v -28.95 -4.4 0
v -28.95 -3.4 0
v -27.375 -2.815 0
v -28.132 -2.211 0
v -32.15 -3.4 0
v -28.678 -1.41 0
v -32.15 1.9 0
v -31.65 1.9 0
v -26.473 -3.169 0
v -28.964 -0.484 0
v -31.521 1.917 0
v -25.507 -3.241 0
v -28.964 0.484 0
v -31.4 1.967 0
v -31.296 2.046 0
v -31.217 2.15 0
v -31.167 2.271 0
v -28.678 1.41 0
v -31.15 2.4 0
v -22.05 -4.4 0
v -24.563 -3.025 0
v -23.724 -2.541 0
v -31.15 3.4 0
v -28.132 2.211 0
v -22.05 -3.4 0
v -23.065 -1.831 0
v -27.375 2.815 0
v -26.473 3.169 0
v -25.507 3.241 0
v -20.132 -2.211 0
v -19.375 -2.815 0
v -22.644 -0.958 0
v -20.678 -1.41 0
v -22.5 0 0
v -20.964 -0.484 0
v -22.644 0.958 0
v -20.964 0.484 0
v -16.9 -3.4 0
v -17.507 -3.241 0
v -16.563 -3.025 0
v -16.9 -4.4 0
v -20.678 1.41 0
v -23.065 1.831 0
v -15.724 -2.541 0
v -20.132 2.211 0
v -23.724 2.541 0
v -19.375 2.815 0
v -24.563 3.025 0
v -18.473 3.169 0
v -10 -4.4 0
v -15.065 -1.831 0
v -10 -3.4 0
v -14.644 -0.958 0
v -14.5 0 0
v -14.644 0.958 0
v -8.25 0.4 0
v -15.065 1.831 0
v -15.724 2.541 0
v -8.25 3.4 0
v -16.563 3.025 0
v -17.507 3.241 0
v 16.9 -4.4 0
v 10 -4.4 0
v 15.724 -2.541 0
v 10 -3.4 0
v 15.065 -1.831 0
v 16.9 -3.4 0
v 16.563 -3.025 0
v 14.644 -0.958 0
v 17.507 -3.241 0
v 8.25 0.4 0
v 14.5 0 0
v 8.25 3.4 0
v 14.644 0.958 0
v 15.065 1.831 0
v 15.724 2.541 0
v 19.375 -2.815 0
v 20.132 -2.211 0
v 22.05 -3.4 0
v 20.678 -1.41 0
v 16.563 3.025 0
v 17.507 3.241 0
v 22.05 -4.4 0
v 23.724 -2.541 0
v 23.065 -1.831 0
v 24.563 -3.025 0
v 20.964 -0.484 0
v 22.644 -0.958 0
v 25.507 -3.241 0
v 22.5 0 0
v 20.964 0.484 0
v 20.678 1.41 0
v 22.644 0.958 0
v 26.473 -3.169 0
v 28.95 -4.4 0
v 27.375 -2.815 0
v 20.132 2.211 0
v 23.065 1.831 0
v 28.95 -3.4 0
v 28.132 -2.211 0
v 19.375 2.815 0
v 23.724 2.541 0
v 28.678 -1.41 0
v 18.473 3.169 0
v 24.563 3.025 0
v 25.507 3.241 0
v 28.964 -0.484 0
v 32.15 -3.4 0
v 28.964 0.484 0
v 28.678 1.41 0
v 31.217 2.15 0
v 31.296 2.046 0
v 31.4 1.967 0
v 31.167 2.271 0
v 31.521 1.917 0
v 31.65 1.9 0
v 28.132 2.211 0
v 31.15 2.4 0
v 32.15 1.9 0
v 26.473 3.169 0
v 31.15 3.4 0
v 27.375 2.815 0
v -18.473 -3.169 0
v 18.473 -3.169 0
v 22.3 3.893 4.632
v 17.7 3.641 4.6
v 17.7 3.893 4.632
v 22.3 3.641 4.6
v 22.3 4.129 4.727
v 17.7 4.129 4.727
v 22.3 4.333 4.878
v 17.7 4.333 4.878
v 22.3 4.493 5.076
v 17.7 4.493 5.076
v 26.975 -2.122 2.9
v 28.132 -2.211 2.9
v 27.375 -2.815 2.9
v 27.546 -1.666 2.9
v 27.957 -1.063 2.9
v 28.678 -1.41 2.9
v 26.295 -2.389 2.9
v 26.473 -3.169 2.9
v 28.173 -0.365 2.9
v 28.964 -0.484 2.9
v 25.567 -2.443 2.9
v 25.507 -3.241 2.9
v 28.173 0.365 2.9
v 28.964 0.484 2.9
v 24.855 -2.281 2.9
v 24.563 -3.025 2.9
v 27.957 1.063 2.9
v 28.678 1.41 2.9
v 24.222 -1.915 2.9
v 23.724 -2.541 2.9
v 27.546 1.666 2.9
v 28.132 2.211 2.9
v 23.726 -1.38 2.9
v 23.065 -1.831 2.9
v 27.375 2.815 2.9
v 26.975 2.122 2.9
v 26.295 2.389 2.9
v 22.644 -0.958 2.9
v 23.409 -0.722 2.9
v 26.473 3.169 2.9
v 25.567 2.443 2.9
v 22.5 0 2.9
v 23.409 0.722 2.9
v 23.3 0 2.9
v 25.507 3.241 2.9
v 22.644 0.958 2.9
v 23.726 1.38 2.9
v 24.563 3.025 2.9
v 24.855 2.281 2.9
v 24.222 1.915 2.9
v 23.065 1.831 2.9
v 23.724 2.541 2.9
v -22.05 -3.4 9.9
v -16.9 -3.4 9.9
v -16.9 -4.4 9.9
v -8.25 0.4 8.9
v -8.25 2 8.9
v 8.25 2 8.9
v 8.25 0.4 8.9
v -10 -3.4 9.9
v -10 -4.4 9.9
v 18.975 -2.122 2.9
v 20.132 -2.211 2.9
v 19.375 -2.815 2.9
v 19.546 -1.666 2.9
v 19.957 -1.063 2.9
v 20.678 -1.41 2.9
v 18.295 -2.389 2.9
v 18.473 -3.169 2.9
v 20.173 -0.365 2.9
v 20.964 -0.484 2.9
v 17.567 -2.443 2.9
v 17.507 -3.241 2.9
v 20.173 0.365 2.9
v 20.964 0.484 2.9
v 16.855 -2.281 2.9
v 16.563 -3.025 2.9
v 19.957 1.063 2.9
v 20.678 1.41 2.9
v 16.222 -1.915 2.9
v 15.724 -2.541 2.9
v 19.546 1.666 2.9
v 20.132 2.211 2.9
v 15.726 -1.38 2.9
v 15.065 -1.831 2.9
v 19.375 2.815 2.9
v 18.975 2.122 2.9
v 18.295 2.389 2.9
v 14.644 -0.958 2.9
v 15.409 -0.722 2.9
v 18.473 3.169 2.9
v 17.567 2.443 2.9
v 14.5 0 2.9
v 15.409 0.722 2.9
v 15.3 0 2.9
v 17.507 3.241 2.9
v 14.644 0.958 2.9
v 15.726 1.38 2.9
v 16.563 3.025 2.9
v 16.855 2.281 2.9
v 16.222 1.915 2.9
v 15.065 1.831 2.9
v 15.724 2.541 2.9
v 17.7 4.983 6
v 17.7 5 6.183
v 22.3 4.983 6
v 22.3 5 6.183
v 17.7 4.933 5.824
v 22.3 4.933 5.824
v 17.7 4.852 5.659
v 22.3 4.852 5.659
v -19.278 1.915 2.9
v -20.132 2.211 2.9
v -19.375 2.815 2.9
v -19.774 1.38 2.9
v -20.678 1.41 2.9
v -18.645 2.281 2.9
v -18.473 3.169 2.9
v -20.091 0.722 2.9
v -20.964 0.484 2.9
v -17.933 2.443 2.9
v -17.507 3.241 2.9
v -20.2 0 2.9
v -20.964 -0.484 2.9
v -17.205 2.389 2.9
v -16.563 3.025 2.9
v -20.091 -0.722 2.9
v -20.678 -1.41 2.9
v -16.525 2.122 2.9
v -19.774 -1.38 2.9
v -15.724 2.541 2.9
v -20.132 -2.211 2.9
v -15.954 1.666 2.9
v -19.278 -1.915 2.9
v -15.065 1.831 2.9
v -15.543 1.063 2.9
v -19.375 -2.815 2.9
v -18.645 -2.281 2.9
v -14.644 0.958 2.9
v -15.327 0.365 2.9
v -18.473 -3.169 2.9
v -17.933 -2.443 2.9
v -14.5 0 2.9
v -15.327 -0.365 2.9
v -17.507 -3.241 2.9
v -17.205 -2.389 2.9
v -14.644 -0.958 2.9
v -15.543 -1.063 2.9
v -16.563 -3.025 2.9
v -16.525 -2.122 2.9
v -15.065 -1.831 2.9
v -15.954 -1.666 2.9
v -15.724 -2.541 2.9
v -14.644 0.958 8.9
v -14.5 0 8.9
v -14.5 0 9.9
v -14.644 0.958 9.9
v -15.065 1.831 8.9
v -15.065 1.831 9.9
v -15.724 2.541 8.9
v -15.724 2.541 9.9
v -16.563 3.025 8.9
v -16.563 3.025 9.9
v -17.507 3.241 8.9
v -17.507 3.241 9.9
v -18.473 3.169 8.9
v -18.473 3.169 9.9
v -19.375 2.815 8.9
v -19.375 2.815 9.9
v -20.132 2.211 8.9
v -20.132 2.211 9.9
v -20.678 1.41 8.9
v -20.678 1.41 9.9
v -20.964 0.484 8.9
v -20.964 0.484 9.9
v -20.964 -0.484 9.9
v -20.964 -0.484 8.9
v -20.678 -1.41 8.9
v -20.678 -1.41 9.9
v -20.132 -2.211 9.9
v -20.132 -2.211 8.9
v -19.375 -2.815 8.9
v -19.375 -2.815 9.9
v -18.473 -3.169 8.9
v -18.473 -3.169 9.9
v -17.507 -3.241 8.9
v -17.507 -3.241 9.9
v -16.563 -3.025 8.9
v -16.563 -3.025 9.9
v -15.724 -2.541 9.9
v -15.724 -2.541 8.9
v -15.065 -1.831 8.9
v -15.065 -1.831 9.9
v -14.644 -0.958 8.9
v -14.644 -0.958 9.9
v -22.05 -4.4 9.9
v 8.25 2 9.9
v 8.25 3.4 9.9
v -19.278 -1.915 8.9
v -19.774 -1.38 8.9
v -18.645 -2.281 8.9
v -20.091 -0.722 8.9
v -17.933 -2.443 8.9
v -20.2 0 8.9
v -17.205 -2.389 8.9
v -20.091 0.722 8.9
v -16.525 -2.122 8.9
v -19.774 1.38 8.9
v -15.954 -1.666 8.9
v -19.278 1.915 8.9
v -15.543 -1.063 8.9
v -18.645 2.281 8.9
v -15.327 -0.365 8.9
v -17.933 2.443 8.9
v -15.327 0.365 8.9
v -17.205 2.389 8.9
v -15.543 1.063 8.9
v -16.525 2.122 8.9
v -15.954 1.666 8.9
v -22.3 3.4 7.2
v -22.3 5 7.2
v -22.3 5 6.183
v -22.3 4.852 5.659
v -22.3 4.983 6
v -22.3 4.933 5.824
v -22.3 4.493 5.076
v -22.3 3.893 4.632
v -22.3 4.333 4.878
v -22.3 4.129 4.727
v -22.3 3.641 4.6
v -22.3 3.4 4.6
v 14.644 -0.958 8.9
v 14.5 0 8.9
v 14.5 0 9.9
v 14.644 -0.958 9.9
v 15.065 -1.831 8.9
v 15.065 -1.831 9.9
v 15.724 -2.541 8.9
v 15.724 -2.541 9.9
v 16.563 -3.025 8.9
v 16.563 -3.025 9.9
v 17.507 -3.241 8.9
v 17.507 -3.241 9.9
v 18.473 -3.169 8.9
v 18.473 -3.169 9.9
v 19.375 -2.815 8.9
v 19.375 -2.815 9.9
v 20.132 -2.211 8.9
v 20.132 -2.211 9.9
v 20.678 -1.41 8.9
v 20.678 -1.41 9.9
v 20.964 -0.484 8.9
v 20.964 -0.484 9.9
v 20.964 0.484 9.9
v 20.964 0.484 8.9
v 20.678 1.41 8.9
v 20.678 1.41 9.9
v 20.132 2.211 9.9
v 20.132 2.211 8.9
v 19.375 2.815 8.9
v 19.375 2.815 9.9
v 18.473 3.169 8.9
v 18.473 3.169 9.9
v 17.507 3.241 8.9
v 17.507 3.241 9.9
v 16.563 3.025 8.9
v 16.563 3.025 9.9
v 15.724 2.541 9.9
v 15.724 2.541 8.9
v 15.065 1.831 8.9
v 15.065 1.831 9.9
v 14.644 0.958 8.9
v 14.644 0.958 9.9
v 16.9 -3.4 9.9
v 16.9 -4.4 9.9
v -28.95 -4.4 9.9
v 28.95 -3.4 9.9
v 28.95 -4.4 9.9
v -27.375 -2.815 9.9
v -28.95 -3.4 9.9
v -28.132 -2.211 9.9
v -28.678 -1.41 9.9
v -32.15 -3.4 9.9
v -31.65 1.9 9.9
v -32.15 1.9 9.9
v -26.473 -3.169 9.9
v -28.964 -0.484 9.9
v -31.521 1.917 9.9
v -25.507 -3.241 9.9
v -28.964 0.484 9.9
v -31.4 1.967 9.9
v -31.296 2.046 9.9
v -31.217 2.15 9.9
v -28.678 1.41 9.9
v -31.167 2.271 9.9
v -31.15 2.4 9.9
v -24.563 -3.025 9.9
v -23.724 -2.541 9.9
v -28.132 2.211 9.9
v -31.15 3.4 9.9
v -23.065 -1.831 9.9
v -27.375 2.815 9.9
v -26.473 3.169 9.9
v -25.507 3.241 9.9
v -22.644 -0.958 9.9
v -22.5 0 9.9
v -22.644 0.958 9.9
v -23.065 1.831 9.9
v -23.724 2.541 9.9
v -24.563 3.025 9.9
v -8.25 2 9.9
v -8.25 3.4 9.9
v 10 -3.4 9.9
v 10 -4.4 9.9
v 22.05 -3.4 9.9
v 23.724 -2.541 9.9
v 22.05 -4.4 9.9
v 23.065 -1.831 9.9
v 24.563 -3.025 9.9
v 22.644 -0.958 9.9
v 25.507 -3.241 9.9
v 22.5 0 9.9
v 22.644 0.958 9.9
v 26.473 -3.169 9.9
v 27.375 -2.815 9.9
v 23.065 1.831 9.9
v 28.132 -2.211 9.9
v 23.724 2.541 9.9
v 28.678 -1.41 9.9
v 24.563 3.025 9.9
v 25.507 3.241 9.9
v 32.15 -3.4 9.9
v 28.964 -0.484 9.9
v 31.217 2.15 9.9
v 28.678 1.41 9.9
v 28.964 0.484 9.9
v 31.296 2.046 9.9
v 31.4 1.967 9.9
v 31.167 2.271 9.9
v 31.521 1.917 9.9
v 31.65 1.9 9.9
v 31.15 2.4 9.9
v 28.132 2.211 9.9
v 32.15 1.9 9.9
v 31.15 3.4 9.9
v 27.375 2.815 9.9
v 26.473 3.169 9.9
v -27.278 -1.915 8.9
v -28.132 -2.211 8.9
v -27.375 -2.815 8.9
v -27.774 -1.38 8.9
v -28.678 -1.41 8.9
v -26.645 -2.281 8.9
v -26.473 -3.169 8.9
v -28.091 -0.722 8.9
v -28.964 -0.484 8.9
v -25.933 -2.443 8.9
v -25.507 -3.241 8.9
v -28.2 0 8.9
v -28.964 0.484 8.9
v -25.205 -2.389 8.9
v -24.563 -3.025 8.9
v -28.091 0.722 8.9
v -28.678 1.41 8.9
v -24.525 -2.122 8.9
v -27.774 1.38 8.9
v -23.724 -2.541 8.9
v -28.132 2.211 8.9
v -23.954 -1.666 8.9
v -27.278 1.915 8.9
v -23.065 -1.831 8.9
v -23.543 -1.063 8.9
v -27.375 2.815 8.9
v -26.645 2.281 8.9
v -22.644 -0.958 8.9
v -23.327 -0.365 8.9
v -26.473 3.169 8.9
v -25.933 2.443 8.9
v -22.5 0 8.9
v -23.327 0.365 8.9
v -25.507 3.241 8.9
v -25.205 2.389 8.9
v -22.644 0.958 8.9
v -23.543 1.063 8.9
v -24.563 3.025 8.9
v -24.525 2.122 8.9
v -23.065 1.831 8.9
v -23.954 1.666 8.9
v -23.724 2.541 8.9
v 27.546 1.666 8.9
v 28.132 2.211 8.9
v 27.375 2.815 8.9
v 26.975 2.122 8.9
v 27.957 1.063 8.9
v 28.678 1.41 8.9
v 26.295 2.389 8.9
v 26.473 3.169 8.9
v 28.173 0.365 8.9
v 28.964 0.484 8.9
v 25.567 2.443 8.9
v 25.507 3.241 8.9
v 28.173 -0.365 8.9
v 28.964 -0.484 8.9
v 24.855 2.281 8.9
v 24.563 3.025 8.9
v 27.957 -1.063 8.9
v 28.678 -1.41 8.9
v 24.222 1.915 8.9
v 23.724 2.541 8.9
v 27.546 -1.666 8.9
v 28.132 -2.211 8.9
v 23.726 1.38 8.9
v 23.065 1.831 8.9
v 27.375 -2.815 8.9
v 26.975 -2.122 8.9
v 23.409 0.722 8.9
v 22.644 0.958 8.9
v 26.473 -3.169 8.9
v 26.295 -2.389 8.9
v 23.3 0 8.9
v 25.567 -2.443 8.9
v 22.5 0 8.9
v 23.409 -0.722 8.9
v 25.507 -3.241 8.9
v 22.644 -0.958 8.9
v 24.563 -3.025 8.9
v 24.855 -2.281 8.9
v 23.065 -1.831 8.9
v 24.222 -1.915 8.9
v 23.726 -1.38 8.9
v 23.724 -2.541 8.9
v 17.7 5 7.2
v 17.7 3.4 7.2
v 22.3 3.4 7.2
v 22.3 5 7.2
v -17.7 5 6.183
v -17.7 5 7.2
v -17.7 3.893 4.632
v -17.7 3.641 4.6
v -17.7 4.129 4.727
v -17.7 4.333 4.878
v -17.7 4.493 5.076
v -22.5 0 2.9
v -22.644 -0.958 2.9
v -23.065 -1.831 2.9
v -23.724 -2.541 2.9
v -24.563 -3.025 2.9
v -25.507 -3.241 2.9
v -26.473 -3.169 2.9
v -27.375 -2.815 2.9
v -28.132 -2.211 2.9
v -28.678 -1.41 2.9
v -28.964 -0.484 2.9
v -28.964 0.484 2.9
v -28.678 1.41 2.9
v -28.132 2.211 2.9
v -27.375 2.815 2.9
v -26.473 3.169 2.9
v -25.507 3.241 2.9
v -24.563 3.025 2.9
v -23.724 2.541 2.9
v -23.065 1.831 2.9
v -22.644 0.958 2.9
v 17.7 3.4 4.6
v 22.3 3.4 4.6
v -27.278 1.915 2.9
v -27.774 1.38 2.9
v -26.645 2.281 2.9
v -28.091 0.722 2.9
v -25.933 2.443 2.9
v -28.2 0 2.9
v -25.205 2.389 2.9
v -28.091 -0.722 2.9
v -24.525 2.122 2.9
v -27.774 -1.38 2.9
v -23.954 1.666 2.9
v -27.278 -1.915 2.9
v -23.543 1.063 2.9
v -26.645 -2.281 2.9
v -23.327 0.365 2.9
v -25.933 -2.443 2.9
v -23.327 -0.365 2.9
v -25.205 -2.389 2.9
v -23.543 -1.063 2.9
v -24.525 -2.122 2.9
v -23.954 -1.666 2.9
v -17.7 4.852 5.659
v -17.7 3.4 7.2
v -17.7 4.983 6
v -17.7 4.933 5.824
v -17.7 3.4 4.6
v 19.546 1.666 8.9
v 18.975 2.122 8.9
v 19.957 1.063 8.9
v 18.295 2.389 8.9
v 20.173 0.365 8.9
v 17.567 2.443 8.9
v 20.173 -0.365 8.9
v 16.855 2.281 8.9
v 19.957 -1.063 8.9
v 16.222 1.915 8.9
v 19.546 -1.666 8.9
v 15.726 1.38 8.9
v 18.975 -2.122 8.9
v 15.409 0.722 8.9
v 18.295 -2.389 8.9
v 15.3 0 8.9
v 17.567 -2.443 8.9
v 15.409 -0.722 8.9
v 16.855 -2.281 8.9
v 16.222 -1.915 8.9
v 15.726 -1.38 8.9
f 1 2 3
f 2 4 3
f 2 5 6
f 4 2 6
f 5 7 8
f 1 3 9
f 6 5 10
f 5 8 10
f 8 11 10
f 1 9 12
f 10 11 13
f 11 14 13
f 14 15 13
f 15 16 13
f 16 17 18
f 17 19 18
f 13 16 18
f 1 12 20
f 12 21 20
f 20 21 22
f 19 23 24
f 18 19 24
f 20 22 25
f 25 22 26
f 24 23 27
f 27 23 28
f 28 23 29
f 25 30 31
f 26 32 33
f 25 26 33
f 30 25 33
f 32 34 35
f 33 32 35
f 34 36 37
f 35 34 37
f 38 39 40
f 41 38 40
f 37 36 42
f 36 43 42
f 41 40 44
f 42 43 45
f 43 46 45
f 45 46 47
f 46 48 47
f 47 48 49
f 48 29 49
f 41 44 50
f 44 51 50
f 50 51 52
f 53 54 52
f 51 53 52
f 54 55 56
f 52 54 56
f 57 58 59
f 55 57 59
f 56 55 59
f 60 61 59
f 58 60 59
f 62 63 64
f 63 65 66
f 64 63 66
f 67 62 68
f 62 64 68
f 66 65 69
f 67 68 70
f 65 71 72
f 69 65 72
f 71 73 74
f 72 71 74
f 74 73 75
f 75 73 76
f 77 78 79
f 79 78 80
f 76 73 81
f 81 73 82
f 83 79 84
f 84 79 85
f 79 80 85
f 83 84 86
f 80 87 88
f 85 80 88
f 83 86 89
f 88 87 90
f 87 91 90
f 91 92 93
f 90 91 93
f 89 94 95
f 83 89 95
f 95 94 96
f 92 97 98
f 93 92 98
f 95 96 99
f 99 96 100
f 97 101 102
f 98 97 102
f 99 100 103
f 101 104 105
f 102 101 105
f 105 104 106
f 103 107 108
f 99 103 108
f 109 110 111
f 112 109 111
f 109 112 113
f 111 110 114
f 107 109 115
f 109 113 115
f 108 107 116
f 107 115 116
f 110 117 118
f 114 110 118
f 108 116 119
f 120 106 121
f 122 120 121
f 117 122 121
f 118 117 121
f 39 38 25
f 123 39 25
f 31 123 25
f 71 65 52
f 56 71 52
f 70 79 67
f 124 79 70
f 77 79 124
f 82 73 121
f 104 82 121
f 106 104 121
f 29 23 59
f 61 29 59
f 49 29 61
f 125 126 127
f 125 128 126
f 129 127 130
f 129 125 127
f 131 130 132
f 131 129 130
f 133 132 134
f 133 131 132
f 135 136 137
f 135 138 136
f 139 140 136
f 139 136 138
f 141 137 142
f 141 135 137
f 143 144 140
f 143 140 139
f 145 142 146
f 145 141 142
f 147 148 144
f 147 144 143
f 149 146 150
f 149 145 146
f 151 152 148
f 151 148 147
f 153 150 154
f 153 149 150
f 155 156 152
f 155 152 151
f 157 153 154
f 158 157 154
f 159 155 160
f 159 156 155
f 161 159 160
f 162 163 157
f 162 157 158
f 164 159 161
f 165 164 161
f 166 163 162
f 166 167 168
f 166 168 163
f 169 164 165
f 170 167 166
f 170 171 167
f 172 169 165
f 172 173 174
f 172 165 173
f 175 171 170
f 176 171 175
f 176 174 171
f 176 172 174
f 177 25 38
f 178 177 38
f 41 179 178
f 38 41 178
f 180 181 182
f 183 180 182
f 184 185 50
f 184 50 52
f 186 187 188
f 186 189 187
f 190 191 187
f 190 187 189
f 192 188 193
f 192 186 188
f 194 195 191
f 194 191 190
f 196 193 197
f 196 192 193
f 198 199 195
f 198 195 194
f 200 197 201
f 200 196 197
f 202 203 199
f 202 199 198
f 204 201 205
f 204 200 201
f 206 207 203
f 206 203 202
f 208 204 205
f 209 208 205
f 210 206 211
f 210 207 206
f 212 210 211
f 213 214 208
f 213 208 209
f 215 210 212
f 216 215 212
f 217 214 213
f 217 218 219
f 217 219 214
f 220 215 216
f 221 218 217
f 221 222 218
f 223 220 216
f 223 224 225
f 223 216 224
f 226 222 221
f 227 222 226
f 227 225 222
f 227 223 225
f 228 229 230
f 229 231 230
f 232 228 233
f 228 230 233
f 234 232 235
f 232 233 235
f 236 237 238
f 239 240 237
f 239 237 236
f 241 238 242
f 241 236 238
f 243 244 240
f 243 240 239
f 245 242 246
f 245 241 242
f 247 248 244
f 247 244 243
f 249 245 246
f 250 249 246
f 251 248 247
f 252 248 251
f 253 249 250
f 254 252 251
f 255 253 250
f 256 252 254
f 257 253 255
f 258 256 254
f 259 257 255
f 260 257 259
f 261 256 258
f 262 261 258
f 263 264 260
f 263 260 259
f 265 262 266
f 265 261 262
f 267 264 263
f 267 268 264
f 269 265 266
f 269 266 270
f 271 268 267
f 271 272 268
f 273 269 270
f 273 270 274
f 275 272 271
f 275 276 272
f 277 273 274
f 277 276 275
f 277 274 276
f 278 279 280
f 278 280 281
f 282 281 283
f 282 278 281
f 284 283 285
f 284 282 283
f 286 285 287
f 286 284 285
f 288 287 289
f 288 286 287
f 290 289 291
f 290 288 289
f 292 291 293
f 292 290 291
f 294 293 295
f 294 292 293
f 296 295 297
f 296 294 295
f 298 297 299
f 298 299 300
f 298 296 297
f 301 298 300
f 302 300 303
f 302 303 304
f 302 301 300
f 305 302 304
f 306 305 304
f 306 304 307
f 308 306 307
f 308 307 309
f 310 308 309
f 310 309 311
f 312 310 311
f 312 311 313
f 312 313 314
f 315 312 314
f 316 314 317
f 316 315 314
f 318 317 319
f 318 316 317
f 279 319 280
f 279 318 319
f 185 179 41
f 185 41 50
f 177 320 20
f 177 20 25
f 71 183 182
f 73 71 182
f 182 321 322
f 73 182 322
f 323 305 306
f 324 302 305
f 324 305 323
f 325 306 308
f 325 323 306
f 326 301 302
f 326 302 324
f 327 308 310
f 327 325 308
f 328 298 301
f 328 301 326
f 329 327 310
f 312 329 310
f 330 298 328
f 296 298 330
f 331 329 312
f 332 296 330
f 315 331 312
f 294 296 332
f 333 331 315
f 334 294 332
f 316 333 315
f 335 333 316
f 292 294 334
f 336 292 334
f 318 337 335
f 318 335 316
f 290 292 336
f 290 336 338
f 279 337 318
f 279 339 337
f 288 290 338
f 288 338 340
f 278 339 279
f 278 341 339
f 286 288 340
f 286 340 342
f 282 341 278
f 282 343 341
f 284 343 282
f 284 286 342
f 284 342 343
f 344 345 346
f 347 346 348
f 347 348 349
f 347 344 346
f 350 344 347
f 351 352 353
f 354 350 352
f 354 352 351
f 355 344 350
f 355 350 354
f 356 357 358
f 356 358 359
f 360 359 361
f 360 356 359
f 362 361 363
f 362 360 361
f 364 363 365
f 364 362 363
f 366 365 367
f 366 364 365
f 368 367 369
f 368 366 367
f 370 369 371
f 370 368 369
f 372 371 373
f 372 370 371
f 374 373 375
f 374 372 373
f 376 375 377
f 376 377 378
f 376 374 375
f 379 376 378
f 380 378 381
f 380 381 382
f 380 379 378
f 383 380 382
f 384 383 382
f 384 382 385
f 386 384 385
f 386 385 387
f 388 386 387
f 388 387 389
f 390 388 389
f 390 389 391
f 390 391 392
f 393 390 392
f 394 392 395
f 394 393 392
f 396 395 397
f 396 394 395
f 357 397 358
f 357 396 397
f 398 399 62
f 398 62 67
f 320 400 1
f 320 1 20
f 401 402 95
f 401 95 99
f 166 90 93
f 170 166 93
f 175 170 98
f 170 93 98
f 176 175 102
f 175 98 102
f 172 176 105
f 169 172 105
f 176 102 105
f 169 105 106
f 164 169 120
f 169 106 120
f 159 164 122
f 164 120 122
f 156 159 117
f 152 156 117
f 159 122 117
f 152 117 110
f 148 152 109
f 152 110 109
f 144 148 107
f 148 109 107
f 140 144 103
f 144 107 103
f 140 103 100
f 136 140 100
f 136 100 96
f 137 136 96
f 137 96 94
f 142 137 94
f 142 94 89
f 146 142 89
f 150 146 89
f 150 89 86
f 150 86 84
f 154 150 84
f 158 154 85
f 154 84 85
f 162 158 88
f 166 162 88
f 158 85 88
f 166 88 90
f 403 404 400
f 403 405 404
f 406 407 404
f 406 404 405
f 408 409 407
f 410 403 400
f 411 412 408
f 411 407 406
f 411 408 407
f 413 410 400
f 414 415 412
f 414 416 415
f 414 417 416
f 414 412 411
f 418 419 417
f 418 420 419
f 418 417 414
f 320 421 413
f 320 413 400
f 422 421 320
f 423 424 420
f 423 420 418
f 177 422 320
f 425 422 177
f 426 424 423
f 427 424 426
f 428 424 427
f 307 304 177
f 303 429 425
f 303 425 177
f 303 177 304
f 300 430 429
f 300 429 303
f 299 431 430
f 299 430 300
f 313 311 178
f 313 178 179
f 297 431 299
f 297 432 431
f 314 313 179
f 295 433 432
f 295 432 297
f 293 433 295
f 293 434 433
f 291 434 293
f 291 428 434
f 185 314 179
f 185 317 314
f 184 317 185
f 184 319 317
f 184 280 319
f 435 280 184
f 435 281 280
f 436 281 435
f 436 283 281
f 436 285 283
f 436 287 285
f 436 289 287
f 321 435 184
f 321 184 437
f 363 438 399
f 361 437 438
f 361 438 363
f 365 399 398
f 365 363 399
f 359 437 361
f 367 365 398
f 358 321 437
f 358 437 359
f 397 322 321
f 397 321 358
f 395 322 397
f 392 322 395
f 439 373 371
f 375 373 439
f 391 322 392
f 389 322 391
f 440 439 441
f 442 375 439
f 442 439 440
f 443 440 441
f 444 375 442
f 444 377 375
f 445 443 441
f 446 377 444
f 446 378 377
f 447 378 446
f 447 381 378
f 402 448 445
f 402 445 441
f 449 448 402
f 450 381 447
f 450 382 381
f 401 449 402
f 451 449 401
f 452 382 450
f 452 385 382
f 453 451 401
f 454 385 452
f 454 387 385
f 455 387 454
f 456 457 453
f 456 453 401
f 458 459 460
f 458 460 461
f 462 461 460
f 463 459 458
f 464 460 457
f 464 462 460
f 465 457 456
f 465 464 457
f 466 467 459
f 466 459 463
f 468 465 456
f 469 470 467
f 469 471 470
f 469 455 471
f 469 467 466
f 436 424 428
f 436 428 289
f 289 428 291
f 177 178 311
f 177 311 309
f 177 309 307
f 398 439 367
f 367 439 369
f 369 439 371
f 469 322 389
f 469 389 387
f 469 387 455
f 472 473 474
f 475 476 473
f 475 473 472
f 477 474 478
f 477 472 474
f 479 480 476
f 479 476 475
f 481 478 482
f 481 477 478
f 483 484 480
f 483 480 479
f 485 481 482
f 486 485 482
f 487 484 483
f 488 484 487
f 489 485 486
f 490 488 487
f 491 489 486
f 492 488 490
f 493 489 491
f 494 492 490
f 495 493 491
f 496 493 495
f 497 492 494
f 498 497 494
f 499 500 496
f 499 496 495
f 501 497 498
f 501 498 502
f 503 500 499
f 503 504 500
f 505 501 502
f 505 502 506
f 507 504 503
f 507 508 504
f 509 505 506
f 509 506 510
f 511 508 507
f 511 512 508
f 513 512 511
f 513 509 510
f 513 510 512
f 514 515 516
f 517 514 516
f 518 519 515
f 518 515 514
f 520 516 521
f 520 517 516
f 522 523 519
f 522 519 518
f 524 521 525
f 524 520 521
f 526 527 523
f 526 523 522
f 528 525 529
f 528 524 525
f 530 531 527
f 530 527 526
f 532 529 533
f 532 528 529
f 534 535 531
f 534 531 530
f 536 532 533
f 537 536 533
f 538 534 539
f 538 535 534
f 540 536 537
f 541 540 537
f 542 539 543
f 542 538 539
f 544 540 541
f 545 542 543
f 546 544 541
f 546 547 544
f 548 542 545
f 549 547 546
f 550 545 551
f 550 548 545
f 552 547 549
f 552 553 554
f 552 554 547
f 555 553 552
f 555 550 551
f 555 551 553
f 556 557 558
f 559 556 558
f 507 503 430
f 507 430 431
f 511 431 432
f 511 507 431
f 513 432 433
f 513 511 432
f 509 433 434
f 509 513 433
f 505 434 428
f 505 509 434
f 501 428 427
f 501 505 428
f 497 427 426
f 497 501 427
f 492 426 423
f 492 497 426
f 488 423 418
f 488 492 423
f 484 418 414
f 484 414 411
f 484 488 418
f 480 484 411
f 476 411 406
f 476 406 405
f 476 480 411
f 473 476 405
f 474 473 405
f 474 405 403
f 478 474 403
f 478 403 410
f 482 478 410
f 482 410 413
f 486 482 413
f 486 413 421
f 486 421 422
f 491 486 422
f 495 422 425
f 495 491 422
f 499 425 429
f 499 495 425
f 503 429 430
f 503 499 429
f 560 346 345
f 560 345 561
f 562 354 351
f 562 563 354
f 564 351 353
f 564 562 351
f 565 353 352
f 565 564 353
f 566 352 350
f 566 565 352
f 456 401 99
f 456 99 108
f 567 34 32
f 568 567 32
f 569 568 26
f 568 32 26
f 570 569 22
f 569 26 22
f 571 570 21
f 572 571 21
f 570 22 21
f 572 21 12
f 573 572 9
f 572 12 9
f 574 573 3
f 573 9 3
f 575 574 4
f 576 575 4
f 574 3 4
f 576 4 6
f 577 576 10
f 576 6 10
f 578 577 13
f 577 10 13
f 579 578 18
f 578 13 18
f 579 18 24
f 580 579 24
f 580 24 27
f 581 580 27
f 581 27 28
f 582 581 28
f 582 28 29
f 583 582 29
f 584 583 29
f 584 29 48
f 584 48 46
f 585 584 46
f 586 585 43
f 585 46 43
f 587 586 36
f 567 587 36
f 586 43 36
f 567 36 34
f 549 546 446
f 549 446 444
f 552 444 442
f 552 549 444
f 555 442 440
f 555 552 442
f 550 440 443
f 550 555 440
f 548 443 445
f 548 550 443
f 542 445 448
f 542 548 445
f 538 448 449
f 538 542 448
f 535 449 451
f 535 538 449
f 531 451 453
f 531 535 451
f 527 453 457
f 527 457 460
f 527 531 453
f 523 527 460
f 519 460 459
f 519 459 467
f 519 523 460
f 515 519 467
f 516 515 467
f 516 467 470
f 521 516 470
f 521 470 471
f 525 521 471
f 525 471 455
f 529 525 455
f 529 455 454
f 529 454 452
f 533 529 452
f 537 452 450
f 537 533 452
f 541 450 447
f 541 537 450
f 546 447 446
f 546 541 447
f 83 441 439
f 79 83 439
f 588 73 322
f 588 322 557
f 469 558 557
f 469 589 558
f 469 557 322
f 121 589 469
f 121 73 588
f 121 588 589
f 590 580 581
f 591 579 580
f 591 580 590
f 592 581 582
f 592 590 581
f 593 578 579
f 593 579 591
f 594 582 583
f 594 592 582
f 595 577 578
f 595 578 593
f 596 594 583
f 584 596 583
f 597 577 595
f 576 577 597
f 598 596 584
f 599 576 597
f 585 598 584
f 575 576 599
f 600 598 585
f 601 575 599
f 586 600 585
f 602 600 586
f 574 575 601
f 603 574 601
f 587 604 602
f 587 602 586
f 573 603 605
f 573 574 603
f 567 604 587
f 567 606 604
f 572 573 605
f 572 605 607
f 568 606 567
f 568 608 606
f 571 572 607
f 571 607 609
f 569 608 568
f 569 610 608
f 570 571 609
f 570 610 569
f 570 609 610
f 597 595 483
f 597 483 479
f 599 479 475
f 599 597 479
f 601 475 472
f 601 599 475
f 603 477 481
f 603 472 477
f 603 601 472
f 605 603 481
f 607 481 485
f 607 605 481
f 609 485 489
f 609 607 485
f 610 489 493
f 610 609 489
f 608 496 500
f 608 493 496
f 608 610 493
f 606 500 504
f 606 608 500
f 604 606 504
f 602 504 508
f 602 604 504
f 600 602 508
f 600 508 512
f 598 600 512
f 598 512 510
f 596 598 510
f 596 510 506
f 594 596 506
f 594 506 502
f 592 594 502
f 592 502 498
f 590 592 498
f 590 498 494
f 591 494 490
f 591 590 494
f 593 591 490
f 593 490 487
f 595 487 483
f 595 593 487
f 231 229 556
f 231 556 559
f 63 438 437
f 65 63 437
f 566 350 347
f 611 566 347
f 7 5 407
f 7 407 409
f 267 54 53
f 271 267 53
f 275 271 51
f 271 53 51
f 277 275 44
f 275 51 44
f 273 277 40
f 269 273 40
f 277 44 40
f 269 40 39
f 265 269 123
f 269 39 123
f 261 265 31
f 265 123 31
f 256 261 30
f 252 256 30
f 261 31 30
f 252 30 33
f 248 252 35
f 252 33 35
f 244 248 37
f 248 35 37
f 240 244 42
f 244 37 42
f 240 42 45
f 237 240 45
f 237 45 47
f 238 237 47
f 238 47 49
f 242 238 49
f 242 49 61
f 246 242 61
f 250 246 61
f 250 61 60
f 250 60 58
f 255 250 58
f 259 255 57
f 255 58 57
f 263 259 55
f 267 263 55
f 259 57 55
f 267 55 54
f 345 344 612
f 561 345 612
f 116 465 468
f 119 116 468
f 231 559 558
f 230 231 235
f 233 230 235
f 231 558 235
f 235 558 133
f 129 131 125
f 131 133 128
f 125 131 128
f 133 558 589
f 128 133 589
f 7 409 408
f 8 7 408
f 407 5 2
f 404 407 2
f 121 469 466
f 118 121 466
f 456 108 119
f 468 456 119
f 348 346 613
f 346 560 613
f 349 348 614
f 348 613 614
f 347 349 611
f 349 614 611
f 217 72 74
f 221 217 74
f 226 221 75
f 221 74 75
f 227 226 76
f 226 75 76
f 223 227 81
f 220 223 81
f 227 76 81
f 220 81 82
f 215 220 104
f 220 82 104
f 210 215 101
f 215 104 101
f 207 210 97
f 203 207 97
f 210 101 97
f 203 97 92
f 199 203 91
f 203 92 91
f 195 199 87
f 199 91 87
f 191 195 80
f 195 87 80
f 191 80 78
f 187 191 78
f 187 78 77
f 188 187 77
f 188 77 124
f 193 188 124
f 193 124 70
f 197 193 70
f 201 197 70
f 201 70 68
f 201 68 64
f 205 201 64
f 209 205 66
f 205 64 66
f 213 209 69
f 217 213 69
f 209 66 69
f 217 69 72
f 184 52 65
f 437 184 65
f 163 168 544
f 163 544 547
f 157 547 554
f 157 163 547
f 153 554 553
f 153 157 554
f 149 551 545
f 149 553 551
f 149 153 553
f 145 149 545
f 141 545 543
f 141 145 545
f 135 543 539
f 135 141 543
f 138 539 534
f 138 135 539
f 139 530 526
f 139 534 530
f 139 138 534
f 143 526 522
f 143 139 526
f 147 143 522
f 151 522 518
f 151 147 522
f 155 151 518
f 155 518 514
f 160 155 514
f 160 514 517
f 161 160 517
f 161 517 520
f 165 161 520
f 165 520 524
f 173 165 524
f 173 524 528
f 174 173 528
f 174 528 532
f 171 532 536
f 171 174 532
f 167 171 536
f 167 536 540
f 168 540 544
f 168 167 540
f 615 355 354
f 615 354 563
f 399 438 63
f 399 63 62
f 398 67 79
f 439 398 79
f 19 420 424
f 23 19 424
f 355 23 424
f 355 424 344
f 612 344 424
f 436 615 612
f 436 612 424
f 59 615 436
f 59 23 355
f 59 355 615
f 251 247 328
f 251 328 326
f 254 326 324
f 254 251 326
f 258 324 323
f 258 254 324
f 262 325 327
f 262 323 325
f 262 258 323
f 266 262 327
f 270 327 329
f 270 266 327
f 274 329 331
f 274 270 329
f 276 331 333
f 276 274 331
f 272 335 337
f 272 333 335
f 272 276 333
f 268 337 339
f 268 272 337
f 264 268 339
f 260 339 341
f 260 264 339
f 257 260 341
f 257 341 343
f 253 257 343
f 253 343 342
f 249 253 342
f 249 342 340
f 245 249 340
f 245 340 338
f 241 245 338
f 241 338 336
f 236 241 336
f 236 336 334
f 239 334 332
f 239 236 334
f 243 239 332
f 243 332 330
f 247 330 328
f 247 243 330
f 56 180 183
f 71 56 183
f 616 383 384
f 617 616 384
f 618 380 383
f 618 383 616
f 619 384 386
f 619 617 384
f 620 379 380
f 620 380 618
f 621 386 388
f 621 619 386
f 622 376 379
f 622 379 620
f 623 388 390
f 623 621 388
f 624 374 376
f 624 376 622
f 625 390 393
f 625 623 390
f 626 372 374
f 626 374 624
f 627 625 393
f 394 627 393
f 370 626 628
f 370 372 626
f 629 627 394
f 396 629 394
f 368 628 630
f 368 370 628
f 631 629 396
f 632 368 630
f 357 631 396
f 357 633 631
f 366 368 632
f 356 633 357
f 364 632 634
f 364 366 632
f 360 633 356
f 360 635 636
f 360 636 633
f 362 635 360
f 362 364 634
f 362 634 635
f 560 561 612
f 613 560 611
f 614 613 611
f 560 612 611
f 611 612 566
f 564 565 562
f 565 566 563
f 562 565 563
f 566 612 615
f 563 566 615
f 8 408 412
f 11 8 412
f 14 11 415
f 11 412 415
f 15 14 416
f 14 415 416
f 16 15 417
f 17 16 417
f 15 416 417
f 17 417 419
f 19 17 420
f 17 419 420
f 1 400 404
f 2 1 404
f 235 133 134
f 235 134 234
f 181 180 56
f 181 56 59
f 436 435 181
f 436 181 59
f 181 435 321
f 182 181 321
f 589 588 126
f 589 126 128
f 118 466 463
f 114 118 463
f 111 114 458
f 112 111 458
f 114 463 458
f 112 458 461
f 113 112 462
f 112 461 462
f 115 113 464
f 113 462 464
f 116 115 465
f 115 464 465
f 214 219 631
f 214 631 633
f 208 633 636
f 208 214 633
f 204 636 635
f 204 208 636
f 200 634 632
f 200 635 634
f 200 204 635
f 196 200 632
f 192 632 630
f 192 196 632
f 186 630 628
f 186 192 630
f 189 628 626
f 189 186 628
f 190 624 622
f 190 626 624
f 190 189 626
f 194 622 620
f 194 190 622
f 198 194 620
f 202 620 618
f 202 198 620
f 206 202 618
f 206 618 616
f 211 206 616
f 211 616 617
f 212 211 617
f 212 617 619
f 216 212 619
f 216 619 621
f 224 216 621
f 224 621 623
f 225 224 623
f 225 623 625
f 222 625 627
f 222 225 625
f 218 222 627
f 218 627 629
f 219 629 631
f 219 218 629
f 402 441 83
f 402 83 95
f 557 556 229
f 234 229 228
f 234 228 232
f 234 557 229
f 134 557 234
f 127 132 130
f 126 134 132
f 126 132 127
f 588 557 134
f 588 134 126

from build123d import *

# Parameters (mm, degrees)
SKETCH1_W           = 64.3
SKETCH1_H           = 6.8
SKETCH1_R           = 2.45
BOSS_EXTRUDE2_DEPTH = 9.9
SKETCH2_R           = 3.25
CUT_EXTRUDE1_DEPTH  = 2.9
CUT_EXTRUDE2_DEPTH  = 11
SKETCH7_W           = 6.9
SKETCH7_H           = 1
BOSS_EXTRUDE3_DEPTH = 9.9
SKETCH8_W           = 16.5
SKETCH8_H           = 6
CUT_EXTRUDE3_DEPTH  = 12
SKETCH9_W           = 16.5
SKETCH9_H           = 1.6
BOSS_EXTRUDE4_DEPTH = 1
SKETCH10_W          = 4.6
SKETCH10_H          = 2.6
BOSS_EXTRUDE5_DEPTH = 1.6
CUT_EXTRUDE4_REACH  = 57.568
FILLET1_R           = 1
CUT_EXTRUDE6_START  = -1
SKETCH13_R          = 3.25
CUT_EXTRUDE6_DEPTH  = 1


with BuildPart() as part:
    # Sketch1 → Boss-Extrude2 (new body)
    with BuildSketch(Plane.XY):
        Rectangle(SKETCH1_W, SKETCH1_H)
        with Locations(Location((-17.75, 0, 0), (0, 0, 180))):
            Circle(SKETCH1_R, mode=Mode.SUBTRACT)
        with Locations(Location((-25.75, 0, 0), (0, 0, 180))):
            Circle(SKETCH1_R, mode=Mode.SUBTRACT)
        with Locations(Location((17.75, 0, 0), (0, 0, 180))):
            Circle(SKETCH1_R, mode=Mode.SUBTRACT)
        with Locations(Location((25.75, 0, 0), (0, 0, 180))):
            Circle(SKETCH1_R, mode=Mode.SUBTRACT)
    extrude(amount=BOSS_EXTRUDE2_DEPTH)

    # Sketch2 → Cut-Extrude1 (cut)
    with BuildSketch(Plane(origin=(0, 0, 0), x_dir=(-1, 0, 0), z_dir=(0, 0, -1))):
        with Locations((-25.75, 0)):
            Circle(SKETCH2_R)
        with Locations((-17.75, 0)):
            Circle(SKETCH2_R)
        with Locations(Location((17.75, 0, 0), (0, 0, 180))):
            Circle(SKETCH2_R)
        with Locations(Location((25.75, 0, 0), (0, 0, 180))):
            Circle(SKETCH2_R)
    extrude(amount=-CUT_EXTRUDE1_DEPTH, mode=Mode.SUBTRACT)

    # Sketch5 → Cut-Extrude2 (cut)
    with BuildSketch(Plane.XY.offset(9.9)):
        with BuildLine():
            Line((32.15, 3.4), (31.15, 3.4))
            Line((31.15, 3.4), (31.15, 2.4))
            ThreePointArc((31.15, 2.4), (31.296446609, 2.046446609), (31.65, 1.9))
            Line((31.65, 1.9), (32.15, 1.9))
            Line((32.15, 1.9), (32.15, 3.4))
        make_face()
        with BuildLine():
            Line((-32.15, 3.4), (-32.15, 1.9))
            Line((-32.15, 1.9), (-31.65, 1.9))
            ThreePointArc((-31.65, 1.9), (-31.296446609, 2.046446609), (-31.15, 2.4))
            Line((-31.15, 2.4), (-31.15, 3.4))
            Line((-31.15, 3.4), (-32.15, 3.4))
        make_face()
    extrude(amount=-CUT_EXTRUDE2_DEPTH, mode=Mode.SUBTRACT)

    # Sketch7 → Boss-Extrude3 (add)
    with BuildSketch(Plane.XY.offset(9.9)):
        with Locations((-25.5, -3.9)):
            Rectangle(SKETCH7_W, SKETCH7_H)
        with Locations((-13.45, -3.9)):
            Rectangle(SKETCH7_W, SKETCH7_H)
        with Locations((13.45, -3.9)):
            Rectangle(SKETCH7_W, SKETCH7_H)
        with Locations((25.5, -3.9)):
            Rectangle(SKETCH7_W, SKETCH7_H)
    extrude(amount=-BOSS_EXTRUDE3_DEPTH)

    # Sketch8 → Cut-Extrude3 (cut)
    with BuildSketch(Plane.XY.offset(9.9)):
        with Locations((0, 3.4)):
            Rectangle(SKETCH8_W, SKETCH8_H)
    extrude(amount=-CUT_EXTRUDE3_DEPTH, mode=Mode.SUBTRACT)

    # Sketch9 → Boss-Extrude4 (add)
    with BuildSketch(Plane.XY.offset(9.9)):
        with Locations((0, 1.2)):
            Rectangle(SKETCH9_W, SKETCH9_H)
    extrude(amount=-BOSS_EXTRUDE4_DEPTH)

    # Sketch10 → Boss-Extrude5 (add)
    with BuildSketch(Plane(origin=(0, 3.4, 0), x_dir=(1, 0, 0), z_dir=(0, 1, 0))):
        with Locations((-20, -5.9)):
            Rectangle(SKETCH10_W, SKETCH10_H)
        with Locations((20, -5.9)):
            Rectangle(SKETCH10_W, SKETCH10_H)
    extrude(amount=BOSS_EXTRUDE5_DEPTH)

    # Cut-Extrude4: up to this face of the body (flat: up to its plane)
    cut_extrude4_end = Plane(part.part.faces().sort_by_distance((22.3, 4.2, 5.9))[0])
    # Sketch11 → Cut-Extrude4 (cut, up to the picked face)
    with BuildSketch(Plane.ZY.offset(22.3), mode=Mode.PRIVATE) as cut_extrude4_sk1:
        Polygon((4.6, 4.2), (5.9, 5), (4.6, 5), align=None)
    cut_extrude4_tool1 = split(extrude(cut_extrude4_sk1.sketch, amount=-CUT_EXTRUDE4_REACH, mode=Mode.PRIVATE), bisect_by=cut_extrude4_end, keep=Keep.BOTH, mode=Mode.PRIVATE)
    add(cut_extrude4_tool1.solids().sort_by(Axis((-22.3, 4.733333, 5.033333), (1, 0, 0)))[0], mode=Mode.SUBTRACT)

    # Fillet1
    fillet1_edges = [part.edges().sort_by_distance(p)[0] for p in [
        (-20, 5, 5.9),
        (-20, 4.2, 4.6),
        (20, 5, 5.9),
        (20, 4.2, 4.6),
    ]]
    fillet(fillet1_edges, radius=FILLET1_R)

    # Sketch13 → Cut-Extrude6 (cut)
    with BuildSketch(Plane.XY.offset(9.9).offset(CUT_EXTRUDE6_START)):
        with Locations((-25.75, 0)):
            Circle(SKETCH13_R)
        with Locations((-17.75, 0)):
            Circle(SKETCH13_R)
        with Locations(Location((25.75, 0, 0), (0, 0, 180))):
            Circle(SKETCH13_R)
        with Locations(Location((17.75, 0, 0), (0, 0, 180))):
            Circle(SKETCH13_R)
    extrude(amount=CUT_EXTRUDE6_DEPTH, mode=Mode.SUBTRACT)


solid = part.part
